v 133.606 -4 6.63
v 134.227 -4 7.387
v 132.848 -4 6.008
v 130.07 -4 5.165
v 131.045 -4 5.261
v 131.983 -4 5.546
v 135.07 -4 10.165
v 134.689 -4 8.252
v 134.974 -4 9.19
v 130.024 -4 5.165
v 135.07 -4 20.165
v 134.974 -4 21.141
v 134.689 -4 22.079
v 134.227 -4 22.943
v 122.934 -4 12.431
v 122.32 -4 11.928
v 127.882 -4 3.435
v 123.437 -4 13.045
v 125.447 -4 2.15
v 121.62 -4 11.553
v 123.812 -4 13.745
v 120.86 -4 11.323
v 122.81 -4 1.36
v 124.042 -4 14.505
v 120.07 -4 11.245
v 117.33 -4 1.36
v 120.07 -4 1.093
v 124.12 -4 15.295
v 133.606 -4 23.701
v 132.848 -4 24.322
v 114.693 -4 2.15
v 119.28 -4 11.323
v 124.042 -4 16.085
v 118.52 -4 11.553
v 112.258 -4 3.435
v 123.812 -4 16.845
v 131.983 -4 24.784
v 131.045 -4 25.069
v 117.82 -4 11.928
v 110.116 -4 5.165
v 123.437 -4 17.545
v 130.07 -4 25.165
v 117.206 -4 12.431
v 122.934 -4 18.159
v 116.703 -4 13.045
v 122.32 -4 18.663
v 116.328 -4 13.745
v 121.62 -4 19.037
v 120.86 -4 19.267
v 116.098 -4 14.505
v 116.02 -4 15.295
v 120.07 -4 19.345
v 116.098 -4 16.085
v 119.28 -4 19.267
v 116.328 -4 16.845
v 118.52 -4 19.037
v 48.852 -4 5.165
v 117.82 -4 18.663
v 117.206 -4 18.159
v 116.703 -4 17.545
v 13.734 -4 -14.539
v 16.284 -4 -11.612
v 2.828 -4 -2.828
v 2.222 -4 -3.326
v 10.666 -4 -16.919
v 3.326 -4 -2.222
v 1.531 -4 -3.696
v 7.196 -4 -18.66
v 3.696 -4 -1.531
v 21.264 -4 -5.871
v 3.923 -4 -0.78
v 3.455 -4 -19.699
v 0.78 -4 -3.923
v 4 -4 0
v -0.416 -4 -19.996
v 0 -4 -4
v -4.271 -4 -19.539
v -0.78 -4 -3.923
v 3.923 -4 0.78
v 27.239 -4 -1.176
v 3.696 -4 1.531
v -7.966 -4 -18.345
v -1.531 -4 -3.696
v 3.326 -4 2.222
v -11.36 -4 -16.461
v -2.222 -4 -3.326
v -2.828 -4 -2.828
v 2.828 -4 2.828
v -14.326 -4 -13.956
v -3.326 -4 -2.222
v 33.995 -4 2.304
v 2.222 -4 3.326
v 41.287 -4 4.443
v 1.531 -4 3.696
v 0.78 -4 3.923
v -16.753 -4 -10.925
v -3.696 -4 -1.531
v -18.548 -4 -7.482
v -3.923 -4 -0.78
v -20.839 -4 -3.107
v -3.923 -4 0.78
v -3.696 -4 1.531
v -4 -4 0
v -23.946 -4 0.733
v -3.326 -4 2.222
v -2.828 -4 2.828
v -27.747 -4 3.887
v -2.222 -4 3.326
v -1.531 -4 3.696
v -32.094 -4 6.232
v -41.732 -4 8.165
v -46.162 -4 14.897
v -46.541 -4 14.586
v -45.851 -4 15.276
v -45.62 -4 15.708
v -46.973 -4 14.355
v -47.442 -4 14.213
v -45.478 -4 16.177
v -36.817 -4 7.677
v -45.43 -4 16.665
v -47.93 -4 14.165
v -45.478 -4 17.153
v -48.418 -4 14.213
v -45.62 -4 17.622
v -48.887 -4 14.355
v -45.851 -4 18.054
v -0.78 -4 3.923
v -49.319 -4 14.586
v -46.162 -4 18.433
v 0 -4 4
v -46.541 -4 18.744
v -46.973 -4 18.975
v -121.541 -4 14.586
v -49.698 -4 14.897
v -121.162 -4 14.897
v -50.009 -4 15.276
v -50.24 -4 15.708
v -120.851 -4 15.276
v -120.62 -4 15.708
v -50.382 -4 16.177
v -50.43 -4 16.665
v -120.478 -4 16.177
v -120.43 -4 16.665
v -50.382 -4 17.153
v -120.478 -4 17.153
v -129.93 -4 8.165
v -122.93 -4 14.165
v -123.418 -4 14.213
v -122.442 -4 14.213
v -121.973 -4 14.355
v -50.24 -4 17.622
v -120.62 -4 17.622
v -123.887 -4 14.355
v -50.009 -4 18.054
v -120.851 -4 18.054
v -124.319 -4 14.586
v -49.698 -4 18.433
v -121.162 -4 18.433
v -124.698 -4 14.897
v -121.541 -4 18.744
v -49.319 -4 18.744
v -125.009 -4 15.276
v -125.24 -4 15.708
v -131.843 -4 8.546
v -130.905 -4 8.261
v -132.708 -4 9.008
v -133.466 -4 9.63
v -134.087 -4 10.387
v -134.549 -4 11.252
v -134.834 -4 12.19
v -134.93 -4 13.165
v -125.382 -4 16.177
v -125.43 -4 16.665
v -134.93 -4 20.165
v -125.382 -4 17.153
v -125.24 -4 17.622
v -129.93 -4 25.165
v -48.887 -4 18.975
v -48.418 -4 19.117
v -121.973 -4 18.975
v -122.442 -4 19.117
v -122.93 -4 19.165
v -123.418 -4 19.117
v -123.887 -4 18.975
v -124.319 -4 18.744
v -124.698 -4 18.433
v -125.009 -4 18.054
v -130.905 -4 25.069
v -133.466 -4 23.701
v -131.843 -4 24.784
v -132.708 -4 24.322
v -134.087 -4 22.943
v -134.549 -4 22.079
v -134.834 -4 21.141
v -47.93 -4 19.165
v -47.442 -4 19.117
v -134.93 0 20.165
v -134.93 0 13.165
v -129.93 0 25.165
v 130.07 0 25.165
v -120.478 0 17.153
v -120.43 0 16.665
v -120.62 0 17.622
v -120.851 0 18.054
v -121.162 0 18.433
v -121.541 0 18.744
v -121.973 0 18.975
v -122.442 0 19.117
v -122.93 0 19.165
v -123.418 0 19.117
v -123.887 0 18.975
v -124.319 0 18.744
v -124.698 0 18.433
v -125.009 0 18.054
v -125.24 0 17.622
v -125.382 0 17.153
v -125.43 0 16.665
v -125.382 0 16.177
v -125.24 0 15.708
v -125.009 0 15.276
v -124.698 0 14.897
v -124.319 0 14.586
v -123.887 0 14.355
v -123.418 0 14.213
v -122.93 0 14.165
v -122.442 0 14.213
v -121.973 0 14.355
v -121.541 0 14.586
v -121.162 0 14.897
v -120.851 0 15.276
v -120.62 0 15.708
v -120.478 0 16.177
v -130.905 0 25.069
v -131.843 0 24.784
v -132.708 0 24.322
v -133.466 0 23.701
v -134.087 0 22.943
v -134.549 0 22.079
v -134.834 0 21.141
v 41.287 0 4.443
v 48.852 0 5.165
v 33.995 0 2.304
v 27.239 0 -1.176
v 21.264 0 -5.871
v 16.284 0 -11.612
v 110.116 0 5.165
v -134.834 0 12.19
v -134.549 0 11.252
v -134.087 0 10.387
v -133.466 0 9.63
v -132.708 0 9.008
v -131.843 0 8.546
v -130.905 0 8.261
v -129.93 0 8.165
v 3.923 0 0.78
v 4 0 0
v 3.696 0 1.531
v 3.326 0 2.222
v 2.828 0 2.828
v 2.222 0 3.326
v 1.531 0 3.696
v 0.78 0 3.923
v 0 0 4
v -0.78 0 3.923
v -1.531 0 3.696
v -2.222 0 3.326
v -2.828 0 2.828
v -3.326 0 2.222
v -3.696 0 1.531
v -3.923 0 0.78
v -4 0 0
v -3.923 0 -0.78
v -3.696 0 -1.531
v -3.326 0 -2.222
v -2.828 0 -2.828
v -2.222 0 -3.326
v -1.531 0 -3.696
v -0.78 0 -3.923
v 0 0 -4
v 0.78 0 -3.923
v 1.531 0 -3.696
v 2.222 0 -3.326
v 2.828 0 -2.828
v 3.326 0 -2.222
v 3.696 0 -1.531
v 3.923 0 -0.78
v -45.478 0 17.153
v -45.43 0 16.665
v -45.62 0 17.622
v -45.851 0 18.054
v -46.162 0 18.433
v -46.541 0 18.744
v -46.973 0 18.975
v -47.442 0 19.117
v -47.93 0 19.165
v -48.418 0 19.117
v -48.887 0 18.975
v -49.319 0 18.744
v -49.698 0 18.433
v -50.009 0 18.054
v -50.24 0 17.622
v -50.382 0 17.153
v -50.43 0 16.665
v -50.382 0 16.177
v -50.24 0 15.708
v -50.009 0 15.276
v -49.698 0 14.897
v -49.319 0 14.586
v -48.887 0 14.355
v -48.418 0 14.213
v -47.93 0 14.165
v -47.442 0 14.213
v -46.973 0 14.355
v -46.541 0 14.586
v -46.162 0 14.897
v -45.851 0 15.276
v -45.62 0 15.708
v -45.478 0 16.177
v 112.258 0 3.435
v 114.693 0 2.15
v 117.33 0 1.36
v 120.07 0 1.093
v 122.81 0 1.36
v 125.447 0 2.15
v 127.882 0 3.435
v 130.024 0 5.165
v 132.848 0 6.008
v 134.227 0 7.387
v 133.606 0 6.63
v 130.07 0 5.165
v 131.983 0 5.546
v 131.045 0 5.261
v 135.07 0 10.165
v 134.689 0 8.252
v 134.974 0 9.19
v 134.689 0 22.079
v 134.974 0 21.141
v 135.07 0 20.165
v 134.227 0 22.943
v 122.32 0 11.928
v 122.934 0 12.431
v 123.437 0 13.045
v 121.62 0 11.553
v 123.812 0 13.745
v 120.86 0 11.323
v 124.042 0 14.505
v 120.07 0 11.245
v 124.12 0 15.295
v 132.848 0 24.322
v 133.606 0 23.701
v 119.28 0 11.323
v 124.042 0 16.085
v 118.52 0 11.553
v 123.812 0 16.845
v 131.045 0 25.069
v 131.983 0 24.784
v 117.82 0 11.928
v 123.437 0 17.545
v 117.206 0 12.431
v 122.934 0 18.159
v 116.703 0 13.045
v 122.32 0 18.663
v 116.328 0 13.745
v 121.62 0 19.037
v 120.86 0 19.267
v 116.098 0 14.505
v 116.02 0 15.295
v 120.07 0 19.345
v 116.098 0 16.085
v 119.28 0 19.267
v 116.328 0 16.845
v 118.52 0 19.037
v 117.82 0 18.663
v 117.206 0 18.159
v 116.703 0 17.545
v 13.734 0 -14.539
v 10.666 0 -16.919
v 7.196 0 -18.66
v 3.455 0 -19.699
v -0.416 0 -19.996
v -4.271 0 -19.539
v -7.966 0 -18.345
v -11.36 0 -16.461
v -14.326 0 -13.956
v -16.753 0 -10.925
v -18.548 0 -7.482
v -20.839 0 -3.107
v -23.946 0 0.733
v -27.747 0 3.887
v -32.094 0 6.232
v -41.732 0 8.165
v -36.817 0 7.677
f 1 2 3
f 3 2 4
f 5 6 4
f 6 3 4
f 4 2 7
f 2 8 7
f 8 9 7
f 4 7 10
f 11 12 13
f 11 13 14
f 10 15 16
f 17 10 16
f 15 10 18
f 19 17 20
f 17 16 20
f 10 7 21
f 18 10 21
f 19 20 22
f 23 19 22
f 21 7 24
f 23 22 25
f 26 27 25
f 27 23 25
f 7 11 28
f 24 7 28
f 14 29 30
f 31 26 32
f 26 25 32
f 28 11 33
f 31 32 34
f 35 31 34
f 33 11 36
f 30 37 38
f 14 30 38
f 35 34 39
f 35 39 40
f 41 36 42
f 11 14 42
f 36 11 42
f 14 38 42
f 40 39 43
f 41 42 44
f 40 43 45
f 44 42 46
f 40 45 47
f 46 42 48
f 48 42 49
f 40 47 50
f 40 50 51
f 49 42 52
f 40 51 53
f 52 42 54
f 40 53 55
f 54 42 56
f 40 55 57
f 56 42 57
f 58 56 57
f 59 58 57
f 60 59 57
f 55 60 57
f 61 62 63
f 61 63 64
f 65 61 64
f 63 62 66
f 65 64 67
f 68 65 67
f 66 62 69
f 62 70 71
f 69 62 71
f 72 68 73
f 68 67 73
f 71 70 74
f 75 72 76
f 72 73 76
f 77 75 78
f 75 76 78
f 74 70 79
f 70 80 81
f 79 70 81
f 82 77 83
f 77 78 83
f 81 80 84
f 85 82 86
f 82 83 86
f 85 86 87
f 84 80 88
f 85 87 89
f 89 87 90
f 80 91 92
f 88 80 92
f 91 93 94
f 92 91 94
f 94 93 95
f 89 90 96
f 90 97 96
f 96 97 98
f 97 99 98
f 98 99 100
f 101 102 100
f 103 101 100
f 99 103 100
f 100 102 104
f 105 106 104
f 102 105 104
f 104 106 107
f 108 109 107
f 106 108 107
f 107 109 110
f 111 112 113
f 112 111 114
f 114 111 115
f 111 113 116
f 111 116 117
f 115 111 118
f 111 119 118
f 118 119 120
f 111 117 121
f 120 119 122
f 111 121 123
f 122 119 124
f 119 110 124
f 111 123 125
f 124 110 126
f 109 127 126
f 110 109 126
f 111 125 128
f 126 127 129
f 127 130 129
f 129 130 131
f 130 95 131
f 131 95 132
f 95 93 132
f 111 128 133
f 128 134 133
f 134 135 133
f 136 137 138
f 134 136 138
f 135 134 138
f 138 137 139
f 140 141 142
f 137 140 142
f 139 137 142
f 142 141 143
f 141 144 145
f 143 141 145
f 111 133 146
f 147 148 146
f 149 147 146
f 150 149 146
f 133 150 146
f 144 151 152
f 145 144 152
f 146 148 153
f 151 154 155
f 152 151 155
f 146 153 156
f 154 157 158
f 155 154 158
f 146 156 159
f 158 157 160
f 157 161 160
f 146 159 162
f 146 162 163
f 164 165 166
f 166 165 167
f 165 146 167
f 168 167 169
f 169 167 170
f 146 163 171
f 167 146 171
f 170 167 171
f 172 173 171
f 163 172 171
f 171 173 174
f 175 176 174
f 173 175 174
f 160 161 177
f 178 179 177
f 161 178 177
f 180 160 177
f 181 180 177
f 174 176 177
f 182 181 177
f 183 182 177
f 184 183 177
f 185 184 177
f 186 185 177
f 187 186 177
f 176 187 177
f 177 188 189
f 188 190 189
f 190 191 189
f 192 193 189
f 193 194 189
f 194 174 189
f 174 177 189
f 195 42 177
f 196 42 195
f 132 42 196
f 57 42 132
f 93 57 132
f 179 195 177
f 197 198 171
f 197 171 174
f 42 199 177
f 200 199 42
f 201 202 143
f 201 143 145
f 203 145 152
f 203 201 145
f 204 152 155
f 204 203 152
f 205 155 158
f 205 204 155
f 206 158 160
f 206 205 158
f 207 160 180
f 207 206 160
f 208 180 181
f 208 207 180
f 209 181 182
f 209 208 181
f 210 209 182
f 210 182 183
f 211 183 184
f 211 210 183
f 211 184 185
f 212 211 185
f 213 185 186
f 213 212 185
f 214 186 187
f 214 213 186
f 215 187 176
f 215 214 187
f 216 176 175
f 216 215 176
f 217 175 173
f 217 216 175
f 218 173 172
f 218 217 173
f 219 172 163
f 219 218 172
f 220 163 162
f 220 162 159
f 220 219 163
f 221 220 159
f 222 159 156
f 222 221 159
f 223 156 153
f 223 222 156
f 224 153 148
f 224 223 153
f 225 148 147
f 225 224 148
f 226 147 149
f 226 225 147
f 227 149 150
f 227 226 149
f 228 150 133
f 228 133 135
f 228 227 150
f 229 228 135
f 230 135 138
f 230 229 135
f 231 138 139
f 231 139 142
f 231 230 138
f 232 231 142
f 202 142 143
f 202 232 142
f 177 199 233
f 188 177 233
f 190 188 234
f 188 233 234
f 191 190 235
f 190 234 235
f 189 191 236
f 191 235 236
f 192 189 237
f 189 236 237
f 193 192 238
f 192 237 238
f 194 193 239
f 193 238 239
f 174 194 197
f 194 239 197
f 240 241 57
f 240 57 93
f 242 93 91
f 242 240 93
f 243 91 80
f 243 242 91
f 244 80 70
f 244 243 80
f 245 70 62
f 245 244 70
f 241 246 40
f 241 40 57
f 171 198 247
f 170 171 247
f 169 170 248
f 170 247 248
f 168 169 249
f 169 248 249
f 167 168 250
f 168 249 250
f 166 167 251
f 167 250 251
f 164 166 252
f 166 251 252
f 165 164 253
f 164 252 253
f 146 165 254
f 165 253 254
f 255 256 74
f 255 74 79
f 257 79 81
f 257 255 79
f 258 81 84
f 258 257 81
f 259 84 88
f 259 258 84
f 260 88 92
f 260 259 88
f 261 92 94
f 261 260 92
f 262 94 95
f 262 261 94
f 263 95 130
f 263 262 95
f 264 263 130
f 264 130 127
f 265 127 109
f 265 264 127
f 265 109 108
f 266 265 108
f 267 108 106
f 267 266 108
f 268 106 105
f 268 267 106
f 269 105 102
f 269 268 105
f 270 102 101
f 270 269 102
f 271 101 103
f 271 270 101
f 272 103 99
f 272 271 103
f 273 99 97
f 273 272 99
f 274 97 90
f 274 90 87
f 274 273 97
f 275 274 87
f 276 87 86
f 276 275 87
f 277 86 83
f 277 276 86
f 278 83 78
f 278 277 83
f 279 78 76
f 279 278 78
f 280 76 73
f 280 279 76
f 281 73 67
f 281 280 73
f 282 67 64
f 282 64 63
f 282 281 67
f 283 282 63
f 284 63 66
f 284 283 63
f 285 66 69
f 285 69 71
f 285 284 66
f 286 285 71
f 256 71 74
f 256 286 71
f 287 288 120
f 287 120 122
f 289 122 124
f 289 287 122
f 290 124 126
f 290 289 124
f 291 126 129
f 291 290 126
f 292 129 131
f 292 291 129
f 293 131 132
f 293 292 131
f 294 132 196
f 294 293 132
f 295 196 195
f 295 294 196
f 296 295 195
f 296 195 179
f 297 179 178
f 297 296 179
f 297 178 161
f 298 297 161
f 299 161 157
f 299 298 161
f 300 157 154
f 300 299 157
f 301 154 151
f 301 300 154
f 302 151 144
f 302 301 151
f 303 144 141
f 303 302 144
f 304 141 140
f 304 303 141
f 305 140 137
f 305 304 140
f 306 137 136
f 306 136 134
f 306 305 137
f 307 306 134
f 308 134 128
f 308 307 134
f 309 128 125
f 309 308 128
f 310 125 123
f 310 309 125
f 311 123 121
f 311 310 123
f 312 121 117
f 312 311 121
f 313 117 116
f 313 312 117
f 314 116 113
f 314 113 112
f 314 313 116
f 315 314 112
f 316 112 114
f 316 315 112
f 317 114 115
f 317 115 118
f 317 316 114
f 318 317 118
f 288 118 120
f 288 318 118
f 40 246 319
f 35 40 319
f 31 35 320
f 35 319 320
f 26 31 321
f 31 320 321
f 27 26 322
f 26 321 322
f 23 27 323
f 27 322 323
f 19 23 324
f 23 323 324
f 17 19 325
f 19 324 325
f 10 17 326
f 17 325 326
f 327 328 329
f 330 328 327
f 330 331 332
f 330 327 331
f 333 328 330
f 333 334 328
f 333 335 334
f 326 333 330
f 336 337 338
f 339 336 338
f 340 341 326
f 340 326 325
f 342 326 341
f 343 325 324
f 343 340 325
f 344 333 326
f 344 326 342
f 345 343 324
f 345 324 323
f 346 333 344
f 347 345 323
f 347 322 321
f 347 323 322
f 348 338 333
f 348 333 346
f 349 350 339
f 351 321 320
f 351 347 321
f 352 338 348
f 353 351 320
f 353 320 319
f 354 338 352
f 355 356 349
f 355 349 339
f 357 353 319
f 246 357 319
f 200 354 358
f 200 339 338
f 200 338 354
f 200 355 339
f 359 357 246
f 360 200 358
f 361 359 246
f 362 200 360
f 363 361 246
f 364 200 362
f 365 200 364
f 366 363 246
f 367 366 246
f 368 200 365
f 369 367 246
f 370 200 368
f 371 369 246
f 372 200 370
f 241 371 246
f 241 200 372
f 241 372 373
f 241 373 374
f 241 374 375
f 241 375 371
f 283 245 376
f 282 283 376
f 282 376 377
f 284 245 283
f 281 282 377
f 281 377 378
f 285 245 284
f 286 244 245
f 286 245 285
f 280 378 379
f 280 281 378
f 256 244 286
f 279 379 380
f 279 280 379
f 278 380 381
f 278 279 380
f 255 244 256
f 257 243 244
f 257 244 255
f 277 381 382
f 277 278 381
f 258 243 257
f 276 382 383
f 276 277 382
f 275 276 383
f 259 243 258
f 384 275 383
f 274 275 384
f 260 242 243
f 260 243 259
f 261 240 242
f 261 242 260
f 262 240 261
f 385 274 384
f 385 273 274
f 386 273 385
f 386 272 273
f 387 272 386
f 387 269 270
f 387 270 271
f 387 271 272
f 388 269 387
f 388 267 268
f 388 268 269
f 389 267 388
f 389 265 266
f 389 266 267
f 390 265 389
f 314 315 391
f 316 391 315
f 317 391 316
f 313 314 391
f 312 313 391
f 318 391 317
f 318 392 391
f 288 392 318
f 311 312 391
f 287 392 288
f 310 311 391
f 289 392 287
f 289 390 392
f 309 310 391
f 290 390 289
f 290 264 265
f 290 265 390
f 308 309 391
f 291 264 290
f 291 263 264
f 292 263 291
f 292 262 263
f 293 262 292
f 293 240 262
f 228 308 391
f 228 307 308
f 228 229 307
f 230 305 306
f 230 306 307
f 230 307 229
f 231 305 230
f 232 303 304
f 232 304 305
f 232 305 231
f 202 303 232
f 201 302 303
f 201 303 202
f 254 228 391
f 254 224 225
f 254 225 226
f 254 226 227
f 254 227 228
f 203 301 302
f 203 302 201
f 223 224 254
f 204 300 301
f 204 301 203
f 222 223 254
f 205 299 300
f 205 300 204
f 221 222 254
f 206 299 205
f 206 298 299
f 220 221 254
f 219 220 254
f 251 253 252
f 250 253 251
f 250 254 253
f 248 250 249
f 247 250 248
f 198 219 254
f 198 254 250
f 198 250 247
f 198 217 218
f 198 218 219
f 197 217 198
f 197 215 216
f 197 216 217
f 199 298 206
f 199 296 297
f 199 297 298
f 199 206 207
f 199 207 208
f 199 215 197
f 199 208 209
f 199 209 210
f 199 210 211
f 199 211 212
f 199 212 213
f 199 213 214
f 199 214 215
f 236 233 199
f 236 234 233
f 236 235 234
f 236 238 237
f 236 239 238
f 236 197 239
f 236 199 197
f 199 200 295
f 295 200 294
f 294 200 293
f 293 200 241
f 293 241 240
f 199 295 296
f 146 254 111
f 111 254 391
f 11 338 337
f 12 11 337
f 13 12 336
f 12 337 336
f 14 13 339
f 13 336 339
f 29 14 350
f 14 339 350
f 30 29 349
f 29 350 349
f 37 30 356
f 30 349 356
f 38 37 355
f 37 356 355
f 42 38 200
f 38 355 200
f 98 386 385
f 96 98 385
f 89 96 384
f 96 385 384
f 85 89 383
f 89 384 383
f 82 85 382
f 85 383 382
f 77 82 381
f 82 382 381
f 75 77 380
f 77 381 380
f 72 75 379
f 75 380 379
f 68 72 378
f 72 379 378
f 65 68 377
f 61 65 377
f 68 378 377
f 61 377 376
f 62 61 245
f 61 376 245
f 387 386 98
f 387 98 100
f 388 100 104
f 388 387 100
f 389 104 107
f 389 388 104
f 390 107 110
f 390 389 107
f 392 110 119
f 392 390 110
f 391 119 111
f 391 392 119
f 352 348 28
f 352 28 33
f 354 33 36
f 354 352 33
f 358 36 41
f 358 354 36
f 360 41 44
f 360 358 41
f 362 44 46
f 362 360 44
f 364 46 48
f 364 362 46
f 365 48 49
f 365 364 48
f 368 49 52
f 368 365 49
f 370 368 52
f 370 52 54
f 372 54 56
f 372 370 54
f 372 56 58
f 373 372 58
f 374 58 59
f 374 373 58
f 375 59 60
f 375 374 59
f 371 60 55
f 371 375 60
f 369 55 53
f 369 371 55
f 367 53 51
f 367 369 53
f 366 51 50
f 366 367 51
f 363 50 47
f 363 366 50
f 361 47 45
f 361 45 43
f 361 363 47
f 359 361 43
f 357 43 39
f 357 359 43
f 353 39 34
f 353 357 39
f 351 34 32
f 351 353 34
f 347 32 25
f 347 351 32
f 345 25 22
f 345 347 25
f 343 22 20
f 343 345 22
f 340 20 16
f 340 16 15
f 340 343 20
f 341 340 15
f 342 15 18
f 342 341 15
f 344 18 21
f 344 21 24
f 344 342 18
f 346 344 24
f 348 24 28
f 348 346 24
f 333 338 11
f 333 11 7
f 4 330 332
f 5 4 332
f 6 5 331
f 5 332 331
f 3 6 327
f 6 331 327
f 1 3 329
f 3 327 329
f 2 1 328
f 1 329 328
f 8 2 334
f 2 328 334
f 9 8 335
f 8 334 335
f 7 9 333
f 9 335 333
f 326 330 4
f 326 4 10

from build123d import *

# Parameters (mm, degrees)
SKETCH_R   = 4
SKETCH_R_2 = 4.05
SKETCH_R_3 = 2.5
PAD_DEPTH  = 4


with BuildPart() as part:
    # Sketch → Pad (new body)
    with BuildSketch(Plane.XZ):
        with BuildLine():
            Line((-134.93, 13.165085), (-134.93, 20.165085))
            ThreePointArc((-129.93, 25.165085), (-133.465534, 23.700619), (-134.93, 20.165085))
            Line((-129.93, 25.165085), (130.07, 25.165085))
            ThreePointArc((135.07, 20.165085), (133.605534, 23.700619), (130.07, 25.165085))
            Line((135.07, 20.165085), (135.07, 10.165085))
            ThreePointArc((130.07, 5.165085), (133.605534, 6.629551), (135.07, 10.165085))
            Line((130.07, 5.165085), (130.023889, 5.165085))
            ThreePointArc((110.116111, 5.165085), (120.07, 1.093085), (130.023889, 5.165085))
            Line((110.116111, 5.165085), (48.852111, 5.165085))
            ThreePointArc((48.852111, 5.165085), (30.534511, 0.724409), (16.284037, -11.611638))
            ThreePointArc((-18.547693, -7.482184), (-2.354598, -19.860913), (16.284037, -11.611638))
            ThreePointArc((-18.547693, -7.482184), (-27.746929, 3.887274), (-41.732309, 8.165085))
            Line((-129.93, 8.165085), (-41.732309, 8.165085))
            ThreePointArc((-134.93, 13.165085), (-133.465534, 9.629551), (-129.93, 8.165085))
        make_face()
        Circle(SKETCH_R, mode=Mode.SUBTRACT)
        with Locations((120.07, 15.295085)):
            Circle(SKETCH_R_2, mode=Mode.SUBTRACT)
        with Locations((-122.93, 16.665085)):
            Circle(SKETCH_R_3, mode=Mode.SUBTRACT)
        with Locations((-47.93, 16.665085)):
            Circle(SKETCH_R_3, mode=Mode.SUBTRACT)
    extrude(amount=PAD_DEPTH)


solid = part.part
